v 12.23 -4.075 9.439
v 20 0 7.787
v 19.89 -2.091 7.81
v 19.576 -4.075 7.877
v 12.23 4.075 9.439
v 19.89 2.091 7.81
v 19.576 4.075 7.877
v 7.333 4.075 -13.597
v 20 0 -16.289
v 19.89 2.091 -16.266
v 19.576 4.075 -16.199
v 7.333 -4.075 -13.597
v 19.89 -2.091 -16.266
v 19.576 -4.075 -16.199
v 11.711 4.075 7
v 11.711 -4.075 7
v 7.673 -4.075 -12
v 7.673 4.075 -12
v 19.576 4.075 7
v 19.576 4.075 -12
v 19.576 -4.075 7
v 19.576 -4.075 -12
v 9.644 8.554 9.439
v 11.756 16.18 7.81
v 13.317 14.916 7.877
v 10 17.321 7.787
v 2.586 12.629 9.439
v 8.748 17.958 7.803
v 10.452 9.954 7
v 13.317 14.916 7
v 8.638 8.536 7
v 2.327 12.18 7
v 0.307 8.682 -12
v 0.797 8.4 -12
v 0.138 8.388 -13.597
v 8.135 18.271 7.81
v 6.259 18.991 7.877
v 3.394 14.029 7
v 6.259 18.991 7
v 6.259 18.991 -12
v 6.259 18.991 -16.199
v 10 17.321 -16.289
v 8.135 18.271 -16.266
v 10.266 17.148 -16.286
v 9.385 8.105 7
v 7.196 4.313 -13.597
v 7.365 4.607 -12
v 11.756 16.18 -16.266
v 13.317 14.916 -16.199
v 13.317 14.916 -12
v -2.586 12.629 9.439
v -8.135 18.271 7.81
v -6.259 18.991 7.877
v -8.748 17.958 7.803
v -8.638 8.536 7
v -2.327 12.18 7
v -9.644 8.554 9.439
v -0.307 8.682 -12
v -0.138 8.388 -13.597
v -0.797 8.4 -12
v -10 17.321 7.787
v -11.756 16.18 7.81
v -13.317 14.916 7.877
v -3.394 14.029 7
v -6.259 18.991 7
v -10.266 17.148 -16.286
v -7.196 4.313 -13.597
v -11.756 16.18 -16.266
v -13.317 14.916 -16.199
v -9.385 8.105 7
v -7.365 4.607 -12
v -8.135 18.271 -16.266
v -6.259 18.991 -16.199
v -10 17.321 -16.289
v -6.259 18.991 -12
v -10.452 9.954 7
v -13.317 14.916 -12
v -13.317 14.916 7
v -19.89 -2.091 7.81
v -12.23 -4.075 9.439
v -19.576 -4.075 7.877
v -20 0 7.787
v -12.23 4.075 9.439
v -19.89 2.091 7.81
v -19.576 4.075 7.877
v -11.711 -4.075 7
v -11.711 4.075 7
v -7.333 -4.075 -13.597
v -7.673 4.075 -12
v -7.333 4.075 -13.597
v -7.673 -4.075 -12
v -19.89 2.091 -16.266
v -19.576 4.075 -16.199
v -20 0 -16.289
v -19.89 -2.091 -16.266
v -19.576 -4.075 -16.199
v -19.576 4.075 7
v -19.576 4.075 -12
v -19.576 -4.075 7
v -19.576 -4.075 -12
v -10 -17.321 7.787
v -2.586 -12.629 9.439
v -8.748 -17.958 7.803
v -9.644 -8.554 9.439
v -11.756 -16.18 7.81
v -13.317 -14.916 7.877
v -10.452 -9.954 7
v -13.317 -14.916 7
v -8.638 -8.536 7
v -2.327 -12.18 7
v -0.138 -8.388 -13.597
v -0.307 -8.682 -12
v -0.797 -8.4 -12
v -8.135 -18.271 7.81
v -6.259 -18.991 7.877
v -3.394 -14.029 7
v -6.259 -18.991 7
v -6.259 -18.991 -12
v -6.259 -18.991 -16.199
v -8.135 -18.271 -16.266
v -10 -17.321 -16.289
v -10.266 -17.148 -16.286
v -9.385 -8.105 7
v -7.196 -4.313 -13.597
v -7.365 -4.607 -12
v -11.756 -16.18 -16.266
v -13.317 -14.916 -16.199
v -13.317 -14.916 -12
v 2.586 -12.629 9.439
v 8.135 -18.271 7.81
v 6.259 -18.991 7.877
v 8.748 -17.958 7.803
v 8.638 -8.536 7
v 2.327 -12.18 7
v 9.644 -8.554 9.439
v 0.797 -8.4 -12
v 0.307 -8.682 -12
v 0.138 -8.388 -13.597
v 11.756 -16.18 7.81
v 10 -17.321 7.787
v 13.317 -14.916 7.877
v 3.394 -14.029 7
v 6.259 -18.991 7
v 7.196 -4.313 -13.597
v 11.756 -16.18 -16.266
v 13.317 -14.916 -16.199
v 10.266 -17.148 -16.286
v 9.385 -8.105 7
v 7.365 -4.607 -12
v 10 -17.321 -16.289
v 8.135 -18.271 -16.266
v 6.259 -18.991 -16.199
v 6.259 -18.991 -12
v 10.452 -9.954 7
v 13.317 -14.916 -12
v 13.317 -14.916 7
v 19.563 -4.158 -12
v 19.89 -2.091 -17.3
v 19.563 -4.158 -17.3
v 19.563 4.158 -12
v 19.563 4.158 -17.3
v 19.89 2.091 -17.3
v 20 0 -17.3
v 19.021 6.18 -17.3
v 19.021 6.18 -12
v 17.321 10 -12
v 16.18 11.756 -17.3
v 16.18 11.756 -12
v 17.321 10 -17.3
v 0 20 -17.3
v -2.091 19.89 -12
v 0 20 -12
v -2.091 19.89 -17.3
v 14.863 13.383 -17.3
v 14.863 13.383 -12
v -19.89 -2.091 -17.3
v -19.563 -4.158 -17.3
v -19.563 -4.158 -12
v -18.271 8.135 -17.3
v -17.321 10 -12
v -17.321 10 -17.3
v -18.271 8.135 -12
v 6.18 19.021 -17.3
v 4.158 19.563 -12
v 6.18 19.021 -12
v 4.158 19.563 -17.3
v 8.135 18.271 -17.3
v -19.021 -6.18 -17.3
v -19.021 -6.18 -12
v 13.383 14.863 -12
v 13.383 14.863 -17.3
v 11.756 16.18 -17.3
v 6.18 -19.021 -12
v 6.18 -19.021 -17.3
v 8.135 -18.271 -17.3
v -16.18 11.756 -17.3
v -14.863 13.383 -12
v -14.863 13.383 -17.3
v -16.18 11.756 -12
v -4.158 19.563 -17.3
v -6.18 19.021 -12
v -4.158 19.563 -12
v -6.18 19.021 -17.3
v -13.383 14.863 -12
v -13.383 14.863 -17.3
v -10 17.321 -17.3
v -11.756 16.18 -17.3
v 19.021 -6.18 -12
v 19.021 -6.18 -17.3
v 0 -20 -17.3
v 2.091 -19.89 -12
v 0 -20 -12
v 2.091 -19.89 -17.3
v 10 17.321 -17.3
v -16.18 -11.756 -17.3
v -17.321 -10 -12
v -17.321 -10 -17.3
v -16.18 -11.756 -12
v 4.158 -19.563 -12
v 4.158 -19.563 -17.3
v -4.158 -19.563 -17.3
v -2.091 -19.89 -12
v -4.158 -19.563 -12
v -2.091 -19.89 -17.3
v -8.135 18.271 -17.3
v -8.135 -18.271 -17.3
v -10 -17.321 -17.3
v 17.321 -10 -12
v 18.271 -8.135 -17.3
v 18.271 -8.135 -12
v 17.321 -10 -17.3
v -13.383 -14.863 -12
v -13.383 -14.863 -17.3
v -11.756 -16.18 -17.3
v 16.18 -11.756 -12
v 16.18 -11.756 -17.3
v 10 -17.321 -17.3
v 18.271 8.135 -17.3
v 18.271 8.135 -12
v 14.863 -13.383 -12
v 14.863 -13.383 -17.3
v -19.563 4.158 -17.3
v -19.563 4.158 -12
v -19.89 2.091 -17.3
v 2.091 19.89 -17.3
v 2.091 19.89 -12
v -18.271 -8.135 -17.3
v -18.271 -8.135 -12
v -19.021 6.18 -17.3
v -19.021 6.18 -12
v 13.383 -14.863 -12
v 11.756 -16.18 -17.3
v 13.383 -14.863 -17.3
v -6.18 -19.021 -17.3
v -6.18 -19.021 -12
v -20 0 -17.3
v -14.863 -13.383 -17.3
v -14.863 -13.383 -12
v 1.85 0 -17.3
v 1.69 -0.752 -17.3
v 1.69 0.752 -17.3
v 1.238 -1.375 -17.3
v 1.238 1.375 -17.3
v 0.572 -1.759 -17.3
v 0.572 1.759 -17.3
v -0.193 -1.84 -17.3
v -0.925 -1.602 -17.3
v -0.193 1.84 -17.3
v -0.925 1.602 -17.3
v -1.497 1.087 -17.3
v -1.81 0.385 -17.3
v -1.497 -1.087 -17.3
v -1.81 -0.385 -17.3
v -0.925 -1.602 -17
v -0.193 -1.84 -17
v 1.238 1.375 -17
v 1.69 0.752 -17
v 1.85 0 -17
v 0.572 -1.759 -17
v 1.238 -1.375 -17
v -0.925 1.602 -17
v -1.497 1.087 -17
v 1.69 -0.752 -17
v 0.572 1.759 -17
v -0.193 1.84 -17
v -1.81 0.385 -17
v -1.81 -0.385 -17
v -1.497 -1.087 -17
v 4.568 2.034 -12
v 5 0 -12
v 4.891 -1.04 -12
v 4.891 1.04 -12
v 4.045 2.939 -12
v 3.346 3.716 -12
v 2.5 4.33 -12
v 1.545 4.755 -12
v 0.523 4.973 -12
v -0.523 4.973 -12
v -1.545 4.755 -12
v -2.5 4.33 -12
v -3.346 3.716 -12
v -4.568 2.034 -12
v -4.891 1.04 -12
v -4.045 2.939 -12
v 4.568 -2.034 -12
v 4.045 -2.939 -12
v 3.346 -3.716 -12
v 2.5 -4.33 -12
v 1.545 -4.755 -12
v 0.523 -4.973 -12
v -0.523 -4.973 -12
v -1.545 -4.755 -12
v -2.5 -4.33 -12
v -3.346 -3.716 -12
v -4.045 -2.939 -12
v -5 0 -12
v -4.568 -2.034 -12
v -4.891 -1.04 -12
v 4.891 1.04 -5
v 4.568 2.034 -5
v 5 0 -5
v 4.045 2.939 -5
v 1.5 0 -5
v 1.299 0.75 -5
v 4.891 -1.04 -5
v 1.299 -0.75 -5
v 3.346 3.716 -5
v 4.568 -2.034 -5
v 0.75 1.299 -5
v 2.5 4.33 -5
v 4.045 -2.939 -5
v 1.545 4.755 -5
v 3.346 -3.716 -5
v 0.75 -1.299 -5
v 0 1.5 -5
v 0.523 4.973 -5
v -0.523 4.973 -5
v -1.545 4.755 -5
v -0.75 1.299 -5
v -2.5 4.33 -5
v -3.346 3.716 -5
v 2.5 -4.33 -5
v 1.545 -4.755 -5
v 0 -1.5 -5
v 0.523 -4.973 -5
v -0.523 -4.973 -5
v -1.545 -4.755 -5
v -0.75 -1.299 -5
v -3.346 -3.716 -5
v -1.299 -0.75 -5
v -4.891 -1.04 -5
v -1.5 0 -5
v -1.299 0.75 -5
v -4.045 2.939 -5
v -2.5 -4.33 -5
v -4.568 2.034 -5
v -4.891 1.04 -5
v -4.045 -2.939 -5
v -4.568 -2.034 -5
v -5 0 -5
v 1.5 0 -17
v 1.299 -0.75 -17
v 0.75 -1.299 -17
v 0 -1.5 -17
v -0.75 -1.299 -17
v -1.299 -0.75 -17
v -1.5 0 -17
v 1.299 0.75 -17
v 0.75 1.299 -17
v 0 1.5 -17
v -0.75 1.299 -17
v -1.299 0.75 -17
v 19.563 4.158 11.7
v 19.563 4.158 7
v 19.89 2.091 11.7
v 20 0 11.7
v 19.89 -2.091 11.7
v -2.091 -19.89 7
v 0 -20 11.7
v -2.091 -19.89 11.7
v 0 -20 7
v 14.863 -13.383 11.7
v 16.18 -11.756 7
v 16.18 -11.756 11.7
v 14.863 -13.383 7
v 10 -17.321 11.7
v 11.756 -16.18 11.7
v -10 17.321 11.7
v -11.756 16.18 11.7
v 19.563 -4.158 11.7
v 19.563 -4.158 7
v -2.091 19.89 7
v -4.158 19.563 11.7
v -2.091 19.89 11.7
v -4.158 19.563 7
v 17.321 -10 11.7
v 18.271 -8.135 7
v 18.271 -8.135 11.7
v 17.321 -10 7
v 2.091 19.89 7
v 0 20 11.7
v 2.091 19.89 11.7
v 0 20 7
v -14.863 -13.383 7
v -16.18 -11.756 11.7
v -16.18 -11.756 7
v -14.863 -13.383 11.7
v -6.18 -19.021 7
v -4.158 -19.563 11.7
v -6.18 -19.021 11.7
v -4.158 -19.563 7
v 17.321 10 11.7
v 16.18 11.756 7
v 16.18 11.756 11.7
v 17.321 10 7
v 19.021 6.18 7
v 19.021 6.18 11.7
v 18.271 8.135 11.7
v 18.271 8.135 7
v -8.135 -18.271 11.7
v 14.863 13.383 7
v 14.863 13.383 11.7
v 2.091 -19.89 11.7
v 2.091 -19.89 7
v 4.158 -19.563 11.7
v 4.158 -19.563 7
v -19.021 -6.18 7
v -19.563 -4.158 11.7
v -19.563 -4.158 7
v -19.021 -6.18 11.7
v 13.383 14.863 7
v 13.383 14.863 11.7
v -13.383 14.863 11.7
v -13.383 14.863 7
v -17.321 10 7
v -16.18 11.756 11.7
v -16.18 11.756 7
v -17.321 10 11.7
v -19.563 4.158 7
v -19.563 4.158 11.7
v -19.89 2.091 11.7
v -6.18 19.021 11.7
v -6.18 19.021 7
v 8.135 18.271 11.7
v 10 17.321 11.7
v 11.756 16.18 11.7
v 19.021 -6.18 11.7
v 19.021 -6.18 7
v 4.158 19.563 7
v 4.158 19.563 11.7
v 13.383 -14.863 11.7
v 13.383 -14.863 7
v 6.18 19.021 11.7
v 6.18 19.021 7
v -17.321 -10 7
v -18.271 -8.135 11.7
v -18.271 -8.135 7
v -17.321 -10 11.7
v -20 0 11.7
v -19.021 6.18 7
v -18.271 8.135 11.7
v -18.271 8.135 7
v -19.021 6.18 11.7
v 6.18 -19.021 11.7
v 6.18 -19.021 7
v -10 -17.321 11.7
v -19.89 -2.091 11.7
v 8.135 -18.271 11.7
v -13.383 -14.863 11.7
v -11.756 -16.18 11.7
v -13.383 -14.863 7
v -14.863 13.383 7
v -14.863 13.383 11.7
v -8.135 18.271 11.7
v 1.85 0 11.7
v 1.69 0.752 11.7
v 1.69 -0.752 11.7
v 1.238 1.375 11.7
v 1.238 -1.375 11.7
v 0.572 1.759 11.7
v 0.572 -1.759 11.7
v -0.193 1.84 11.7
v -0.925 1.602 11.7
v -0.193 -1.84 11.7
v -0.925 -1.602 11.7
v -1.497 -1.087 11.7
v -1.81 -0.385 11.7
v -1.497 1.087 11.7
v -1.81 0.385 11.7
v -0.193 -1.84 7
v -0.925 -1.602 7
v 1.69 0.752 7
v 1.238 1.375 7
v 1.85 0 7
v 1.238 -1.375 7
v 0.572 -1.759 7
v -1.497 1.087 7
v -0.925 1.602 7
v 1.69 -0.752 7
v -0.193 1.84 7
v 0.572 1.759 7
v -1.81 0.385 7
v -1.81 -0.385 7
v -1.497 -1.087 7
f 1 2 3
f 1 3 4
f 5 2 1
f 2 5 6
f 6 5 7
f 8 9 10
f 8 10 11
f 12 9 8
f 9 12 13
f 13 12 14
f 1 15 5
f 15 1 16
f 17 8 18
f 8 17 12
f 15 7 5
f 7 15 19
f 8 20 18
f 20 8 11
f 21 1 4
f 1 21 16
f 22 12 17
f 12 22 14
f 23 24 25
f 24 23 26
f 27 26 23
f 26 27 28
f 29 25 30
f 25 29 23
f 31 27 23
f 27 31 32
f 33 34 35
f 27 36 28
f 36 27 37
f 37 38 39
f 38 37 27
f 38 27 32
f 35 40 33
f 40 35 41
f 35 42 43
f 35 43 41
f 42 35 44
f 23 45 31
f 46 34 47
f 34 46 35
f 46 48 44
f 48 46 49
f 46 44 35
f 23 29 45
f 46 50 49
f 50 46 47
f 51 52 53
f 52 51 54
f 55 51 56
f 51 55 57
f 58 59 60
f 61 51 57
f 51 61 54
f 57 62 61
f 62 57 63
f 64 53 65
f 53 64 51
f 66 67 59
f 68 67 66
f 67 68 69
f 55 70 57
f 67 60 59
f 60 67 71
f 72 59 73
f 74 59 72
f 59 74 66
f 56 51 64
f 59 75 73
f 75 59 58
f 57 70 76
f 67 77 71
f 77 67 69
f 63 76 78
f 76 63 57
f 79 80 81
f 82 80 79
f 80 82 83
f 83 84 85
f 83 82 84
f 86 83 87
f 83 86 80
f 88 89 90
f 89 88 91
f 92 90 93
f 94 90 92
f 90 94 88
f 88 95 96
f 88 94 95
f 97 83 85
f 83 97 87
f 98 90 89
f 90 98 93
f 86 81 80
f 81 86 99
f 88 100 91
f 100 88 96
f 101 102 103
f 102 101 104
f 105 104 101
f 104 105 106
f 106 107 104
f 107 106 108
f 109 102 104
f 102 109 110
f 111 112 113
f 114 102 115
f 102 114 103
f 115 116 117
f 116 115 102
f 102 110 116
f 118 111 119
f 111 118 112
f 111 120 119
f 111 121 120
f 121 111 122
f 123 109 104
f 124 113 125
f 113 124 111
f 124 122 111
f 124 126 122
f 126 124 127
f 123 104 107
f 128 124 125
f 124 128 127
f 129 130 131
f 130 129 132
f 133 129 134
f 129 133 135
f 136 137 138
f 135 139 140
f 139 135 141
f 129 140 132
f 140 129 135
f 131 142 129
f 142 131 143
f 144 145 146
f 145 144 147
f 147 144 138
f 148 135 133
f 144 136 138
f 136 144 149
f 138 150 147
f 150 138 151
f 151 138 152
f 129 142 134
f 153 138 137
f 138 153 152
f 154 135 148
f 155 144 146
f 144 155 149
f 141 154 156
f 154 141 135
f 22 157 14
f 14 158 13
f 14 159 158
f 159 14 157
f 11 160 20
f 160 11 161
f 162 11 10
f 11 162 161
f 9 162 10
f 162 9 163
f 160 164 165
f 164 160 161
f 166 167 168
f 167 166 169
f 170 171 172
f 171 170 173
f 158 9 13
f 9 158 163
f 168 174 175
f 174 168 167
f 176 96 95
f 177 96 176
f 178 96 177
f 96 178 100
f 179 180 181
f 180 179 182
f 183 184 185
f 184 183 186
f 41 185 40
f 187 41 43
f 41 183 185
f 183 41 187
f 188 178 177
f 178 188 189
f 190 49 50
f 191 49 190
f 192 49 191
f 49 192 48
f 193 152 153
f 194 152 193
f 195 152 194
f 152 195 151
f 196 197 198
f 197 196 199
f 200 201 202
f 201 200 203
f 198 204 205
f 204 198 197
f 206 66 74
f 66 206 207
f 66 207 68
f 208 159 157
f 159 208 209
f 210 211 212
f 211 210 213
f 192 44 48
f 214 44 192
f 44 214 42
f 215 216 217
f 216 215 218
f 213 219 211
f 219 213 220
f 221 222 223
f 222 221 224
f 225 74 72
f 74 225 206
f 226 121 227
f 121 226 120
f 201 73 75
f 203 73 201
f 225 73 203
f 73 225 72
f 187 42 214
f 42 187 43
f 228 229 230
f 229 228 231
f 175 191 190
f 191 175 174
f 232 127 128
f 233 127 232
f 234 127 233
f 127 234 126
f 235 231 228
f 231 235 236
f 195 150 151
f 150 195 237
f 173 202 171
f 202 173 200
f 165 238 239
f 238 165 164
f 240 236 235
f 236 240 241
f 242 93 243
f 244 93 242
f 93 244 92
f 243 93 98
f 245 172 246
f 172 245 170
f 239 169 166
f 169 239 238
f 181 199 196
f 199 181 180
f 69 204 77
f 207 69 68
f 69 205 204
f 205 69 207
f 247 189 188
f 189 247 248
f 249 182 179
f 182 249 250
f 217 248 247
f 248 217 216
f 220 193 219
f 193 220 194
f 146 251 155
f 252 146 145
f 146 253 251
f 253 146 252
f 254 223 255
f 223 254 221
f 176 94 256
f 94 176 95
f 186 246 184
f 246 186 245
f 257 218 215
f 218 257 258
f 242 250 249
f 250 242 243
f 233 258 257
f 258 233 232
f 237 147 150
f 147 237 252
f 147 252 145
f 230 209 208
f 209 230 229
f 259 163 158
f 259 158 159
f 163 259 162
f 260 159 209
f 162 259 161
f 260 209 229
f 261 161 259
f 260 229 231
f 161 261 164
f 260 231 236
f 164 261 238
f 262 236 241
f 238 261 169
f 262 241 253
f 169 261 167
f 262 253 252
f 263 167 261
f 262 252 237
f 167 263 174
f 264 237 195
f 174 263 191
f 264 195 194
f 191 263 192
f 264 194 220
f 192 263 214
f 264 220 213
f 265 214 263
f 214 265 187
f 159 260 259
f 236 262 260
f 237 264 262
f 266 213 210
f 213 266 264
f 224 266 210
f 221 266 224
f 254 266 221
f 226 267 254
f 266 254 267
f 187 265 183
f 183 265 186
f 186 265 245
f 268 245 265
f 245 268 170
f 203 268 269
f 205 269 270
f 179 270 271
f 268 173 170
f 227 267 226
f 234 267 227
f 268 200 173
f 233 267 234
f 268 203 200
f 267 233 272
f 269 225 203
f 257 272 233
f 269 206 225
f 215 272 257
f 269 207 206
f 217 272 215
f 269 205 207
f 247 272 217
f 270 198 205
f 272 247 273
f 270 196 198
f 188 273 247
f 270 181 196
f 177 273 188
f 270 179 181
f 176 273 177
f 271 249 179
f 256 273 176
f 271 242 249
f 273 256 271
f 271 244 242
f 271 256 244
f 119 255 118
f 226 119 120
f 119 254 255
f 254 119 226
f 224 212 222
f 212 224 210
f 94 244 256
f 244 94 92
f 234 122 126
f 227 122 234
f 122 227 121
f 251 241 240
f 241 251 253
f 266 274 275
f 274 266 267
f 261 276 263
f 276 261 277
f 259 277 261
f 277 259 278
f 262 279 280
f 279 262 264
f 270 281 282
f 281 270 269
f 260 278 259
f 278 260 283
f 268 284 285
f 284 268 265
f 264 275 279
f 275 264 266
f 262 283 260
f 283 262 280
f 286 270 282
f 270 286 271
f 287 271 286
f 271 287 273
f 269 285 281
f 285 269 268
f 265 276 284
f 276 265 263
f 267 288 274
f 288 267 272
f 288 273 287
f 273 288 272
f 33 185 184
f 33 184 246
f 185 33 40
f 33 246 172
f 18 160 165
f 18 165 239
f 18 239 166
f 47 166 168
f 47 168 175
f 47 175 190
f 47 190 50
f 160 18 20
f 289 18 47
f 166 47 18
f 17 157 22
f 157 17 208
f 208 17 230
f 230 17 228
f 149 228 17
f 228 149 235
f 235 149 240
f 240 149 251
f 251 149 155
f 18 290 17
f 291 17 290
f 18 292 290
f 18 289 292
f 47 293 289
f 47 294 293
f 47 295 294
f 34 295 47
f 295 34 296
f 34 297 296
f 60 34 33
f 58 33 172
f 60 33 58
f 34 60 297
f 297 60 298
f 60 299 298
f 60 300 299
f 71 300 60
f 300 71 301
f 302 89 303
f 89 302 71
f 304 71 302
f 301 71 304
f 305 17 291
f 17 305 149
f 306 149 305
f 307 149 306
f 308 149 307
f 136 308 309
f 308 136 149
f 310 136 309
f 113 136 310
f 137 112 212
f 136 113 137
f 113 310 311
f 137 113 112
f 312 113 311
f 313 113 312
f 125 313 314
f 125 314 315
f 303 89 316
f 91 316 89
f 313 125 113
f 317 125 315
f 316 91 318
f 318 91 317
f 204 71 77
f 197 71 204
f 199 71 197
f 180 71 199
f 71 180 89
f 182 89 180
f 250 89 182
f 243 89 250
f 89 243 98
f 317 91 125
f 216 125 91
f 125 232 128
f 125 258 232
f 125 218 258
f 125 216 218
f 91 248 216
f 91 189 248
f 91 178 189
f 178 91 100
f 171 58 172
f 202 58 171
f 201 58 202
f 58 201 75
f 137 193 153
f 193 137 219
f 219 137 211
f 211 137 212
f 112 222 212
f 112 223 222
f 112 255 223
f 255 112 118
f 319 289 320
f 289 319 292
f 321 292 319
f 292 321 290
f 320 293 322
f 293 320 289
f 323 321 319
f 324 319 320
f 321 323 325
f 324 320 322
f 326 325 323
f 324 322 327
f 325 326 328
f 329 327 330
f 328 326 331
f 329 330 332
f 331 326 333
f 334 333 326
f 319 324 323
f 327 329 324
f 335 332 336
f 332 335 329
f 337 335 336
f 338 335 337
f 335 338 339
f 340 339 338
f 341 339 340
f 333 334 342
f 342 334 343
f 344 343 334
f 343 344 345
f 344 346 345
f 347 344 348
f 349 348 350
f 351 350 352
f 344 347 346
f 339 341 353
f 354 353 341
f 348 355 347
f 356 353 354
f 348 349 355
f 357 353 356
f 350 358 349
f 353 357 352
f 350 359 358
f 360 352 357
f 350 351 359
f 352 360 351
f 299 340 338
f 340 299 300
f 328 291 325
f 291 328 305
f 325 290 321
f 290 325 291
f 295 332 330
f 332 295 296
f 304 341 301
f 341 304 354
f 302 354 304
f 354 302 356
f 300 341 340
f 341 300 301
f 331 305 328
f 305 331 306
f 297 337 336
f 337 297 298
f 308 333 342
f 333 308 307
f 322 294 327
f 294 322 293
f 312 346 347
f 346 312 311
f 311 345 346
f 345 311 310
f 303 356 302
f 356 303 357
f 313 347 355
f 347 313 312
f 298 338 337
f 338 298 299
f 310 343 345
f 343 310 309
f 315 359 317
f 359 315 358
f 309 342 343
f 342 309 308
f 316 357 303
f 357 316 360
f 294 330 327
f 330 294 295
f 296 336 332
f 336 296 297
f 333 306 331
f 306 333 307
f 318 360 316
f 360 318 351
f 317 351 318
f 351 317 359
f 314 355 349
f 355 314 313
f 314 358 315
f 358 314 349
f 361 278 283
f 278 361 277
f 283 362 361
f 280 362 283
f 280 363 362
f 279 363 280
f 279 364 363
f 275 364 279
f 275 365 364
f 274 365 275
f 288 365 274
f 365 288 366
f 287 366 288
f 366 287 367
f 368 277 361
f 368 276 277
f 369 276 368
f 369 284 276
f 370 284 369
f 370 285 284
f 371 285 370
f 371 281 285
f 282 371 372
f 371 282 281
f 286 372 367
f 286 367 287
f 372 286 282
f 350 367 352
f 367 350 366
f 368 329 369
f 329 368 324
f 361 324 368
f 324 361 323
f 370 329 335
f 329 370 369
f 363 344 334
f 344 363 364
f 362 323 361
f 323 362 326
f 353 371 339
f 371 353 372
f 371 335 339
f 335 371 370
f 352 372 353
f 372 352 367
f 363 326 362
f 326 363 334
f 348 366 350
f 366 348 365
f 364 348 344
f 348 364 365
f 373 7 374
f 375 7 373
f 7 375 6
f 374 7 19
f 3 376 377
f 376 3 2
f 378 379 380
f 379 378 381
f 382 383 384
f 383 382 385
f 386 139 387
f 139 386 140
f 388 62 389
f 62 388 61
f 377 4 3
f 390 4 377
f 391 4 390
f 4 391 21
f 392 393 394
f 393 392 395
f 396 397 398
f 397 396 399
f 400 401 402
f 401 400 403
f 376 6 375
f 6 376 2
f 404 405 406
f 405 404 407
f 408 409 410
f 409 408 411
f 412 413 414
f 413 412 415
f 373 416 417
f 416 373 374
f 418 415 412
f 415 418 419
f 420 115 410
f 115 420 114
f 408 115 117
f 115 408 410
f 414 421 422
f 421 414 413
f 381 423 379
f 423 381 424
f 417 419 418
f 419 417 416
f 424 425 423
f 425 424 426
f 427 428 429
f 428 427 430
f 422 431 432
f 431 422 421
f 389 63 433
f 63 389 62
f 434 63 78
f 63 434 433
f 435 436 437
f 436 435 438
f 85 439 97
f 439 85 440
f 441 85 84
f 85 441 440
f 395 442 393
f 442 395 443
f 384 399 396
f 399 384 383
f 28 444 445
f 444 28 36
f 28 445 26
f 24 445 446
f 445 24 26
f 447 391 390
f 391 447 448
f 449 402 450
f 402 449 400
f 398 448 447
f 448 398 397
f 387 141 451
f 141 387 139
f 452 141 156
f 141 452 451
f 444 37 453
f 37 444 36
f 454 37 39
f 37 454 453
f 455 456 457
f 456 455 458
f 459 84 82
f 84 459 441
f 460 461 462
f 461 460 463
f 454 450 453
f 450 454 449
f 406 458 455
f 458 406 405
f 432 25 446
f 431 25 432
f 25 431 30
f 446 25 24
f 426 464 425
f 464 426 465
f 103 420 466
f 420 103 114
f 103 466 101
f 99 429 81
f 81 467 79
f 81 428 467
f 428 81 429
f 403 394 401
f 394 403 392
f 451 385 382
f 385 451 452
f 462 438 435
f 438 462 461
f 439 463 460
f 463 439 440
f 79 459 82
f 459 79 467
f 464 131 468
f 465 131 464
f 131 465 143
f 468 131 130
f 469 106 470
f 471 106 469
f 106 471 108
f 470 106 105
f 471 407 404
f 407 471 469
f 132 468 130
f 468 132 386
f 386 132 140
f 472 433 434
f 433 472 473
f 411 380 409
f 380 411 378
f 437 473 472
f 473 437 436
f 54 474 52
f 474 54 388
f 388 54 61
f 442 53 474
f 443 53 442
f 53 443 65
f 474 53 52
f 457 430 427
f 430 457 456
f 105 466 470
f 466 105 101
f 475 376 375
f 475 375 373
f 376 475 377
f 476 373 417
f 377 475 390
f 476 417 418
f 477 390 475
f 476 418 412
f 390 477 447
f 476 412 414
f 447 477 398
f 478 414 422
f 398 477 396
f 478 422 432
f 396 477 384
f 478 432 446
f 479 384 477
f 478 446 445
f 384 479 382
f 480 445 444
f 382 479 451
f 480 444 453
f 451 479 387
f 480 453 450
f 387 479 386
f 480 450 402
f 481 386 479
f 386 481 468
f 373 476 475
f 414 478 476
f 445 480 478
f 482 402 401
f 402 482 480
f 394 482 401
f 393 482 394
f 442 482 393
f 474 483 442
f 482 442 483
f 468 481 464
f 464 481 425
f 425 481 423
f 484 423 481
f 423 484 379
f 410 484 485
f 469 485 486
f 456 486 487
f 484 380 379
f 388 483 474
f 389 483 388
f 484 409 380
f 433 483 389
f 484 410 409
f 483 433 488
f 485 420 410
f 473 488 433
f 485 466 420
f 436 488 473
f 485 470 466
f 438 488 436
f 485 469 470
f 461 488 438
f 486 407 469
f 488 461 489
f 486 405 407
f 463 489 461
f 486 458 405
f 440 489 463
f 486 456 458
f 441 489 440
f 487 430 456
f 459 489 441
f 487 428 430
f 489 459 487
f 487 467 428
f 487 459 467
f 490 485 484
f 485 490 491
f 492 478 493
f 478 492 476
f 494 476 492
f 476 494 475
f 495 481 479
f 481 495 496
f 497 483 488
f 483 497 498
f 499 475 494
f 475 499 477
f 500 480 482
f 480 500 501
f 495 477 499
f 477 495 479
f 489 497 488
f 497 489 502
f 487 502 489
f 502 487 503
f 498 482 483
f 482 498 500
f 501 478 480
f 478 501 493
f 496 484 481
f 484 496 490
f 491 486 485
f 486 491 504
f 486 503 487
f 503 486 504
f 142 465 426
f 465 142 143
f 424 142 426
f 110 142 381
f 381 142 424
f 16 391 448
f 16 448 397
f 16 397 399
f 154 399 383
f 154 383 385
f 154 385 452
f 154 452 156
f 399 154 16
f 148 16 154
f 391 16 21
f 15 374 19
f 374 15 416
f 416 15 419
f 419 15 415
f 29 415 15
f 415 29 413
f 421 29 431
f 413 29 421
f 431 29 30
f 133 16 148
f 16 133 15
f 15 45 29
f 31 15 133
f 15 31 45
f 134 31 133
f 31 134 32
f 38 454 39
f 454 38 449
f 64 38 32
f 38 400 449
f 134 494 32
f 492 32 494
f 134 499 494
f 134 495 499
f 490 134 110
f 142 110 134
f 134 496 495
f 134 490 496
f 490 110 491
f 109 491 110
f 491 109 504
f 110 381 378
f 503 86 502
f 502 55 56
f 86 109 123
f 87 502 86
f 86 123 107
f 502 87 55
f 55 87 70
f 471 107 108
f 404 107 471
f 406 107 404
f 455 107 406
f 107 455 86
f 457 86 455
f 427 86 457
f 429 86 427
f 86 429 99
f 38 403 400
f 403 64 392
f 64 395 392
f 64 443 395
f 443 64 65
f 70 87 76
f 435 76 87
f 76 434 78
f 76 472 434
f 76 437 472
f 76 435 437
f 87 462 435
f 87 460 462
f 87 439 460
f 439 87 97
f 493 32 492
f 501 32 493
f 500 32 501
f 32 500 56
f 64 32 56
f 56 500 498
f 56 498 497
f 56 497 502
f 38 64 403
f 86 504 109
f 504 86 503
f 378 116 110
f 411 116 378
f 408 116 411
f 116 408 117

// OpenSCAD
angle=12;
offset=-2.3;

difference(){
translate([0,0,offset])cylinder(d=40,h=30,$fn=60,center=true);
cylinder(d=3.7,h=60,$fn=15,center=true);
for(i=[0:60:330]){
rotate([0,0,i])
rotate([0,angle,0])translate([22,0,0])
cube([24,8.15,23.55],center=true);
}
translate([0,0,-12])cylinder(d=50,h=30);
}
difference(){
translate([0,0,-17])cylinder(d=10,h=12,$fn=30);
cylinder(d=3,h=100,$fn=12,center=true);
}

difference(){
translate([0,0,offset])cylinder(d=40,h=28,$fn=60,center=true);
cylinder(d=3.7,h=60,$fn=15,center=true);
for(i=[0:60:330]){
rotate([0,0,i])
rotate([0,angle,0])translate([22,0,0])
cube([24,8.15,23.55],center=true);
}
translate([0,0,-23])cylinder(d=50,h=30);
}

%rotate([0,angle,0])translate([22,0,0])
cube([24,8.15,23.55],center=true);
